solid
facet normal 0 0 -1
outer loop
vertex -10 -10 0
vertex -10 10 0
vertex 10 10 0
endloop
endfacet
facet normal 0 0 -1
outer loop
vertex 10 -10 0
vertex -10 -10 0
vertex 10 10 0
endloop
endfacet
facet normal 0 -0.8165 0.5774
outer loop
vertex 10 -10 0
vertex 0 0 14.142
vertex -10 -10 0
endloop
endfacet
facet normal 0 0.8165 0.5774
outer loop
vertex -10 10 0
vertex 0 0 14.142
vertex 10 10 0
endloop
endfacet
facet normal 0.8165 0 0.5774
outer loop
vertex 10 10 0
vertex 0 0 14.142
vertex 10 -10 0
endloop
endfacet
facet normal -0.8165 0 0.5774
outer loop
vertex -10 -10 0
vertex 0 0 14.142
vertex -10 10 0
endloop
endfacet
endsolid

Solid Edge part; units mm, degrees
sketch "Sketch1" plane through (0, 0, 0) normal (0, 0, 1) x (1, 0, 0)
  line L0 (10, -10) -> (10, 10)
  line L1 (10, 10) -> (-10, 10)
  line L2 (-10, 10) -> (-10, -10)
  line L3 (-10, -10) -> (10, -10)
extrude "Protrusion1" add sketch "Sketch1" along normal blind 73.108
sketch "Sketch2" plane through (0, 0, 0) normal (1, 0, 0) x (0, 1, 0)
  line L0 (0, 14.1421) -> (10, 0)
extrude "Cutout1" cut sketch "Sketch2" along normal up to next and the other way up to next material side at (0, 5.0408, 7.0999)
pattern_circular "Pattern1" count 4 over 360 about axis through (0, 0, 0) along (0, 0, 1) of "Cutout1"
